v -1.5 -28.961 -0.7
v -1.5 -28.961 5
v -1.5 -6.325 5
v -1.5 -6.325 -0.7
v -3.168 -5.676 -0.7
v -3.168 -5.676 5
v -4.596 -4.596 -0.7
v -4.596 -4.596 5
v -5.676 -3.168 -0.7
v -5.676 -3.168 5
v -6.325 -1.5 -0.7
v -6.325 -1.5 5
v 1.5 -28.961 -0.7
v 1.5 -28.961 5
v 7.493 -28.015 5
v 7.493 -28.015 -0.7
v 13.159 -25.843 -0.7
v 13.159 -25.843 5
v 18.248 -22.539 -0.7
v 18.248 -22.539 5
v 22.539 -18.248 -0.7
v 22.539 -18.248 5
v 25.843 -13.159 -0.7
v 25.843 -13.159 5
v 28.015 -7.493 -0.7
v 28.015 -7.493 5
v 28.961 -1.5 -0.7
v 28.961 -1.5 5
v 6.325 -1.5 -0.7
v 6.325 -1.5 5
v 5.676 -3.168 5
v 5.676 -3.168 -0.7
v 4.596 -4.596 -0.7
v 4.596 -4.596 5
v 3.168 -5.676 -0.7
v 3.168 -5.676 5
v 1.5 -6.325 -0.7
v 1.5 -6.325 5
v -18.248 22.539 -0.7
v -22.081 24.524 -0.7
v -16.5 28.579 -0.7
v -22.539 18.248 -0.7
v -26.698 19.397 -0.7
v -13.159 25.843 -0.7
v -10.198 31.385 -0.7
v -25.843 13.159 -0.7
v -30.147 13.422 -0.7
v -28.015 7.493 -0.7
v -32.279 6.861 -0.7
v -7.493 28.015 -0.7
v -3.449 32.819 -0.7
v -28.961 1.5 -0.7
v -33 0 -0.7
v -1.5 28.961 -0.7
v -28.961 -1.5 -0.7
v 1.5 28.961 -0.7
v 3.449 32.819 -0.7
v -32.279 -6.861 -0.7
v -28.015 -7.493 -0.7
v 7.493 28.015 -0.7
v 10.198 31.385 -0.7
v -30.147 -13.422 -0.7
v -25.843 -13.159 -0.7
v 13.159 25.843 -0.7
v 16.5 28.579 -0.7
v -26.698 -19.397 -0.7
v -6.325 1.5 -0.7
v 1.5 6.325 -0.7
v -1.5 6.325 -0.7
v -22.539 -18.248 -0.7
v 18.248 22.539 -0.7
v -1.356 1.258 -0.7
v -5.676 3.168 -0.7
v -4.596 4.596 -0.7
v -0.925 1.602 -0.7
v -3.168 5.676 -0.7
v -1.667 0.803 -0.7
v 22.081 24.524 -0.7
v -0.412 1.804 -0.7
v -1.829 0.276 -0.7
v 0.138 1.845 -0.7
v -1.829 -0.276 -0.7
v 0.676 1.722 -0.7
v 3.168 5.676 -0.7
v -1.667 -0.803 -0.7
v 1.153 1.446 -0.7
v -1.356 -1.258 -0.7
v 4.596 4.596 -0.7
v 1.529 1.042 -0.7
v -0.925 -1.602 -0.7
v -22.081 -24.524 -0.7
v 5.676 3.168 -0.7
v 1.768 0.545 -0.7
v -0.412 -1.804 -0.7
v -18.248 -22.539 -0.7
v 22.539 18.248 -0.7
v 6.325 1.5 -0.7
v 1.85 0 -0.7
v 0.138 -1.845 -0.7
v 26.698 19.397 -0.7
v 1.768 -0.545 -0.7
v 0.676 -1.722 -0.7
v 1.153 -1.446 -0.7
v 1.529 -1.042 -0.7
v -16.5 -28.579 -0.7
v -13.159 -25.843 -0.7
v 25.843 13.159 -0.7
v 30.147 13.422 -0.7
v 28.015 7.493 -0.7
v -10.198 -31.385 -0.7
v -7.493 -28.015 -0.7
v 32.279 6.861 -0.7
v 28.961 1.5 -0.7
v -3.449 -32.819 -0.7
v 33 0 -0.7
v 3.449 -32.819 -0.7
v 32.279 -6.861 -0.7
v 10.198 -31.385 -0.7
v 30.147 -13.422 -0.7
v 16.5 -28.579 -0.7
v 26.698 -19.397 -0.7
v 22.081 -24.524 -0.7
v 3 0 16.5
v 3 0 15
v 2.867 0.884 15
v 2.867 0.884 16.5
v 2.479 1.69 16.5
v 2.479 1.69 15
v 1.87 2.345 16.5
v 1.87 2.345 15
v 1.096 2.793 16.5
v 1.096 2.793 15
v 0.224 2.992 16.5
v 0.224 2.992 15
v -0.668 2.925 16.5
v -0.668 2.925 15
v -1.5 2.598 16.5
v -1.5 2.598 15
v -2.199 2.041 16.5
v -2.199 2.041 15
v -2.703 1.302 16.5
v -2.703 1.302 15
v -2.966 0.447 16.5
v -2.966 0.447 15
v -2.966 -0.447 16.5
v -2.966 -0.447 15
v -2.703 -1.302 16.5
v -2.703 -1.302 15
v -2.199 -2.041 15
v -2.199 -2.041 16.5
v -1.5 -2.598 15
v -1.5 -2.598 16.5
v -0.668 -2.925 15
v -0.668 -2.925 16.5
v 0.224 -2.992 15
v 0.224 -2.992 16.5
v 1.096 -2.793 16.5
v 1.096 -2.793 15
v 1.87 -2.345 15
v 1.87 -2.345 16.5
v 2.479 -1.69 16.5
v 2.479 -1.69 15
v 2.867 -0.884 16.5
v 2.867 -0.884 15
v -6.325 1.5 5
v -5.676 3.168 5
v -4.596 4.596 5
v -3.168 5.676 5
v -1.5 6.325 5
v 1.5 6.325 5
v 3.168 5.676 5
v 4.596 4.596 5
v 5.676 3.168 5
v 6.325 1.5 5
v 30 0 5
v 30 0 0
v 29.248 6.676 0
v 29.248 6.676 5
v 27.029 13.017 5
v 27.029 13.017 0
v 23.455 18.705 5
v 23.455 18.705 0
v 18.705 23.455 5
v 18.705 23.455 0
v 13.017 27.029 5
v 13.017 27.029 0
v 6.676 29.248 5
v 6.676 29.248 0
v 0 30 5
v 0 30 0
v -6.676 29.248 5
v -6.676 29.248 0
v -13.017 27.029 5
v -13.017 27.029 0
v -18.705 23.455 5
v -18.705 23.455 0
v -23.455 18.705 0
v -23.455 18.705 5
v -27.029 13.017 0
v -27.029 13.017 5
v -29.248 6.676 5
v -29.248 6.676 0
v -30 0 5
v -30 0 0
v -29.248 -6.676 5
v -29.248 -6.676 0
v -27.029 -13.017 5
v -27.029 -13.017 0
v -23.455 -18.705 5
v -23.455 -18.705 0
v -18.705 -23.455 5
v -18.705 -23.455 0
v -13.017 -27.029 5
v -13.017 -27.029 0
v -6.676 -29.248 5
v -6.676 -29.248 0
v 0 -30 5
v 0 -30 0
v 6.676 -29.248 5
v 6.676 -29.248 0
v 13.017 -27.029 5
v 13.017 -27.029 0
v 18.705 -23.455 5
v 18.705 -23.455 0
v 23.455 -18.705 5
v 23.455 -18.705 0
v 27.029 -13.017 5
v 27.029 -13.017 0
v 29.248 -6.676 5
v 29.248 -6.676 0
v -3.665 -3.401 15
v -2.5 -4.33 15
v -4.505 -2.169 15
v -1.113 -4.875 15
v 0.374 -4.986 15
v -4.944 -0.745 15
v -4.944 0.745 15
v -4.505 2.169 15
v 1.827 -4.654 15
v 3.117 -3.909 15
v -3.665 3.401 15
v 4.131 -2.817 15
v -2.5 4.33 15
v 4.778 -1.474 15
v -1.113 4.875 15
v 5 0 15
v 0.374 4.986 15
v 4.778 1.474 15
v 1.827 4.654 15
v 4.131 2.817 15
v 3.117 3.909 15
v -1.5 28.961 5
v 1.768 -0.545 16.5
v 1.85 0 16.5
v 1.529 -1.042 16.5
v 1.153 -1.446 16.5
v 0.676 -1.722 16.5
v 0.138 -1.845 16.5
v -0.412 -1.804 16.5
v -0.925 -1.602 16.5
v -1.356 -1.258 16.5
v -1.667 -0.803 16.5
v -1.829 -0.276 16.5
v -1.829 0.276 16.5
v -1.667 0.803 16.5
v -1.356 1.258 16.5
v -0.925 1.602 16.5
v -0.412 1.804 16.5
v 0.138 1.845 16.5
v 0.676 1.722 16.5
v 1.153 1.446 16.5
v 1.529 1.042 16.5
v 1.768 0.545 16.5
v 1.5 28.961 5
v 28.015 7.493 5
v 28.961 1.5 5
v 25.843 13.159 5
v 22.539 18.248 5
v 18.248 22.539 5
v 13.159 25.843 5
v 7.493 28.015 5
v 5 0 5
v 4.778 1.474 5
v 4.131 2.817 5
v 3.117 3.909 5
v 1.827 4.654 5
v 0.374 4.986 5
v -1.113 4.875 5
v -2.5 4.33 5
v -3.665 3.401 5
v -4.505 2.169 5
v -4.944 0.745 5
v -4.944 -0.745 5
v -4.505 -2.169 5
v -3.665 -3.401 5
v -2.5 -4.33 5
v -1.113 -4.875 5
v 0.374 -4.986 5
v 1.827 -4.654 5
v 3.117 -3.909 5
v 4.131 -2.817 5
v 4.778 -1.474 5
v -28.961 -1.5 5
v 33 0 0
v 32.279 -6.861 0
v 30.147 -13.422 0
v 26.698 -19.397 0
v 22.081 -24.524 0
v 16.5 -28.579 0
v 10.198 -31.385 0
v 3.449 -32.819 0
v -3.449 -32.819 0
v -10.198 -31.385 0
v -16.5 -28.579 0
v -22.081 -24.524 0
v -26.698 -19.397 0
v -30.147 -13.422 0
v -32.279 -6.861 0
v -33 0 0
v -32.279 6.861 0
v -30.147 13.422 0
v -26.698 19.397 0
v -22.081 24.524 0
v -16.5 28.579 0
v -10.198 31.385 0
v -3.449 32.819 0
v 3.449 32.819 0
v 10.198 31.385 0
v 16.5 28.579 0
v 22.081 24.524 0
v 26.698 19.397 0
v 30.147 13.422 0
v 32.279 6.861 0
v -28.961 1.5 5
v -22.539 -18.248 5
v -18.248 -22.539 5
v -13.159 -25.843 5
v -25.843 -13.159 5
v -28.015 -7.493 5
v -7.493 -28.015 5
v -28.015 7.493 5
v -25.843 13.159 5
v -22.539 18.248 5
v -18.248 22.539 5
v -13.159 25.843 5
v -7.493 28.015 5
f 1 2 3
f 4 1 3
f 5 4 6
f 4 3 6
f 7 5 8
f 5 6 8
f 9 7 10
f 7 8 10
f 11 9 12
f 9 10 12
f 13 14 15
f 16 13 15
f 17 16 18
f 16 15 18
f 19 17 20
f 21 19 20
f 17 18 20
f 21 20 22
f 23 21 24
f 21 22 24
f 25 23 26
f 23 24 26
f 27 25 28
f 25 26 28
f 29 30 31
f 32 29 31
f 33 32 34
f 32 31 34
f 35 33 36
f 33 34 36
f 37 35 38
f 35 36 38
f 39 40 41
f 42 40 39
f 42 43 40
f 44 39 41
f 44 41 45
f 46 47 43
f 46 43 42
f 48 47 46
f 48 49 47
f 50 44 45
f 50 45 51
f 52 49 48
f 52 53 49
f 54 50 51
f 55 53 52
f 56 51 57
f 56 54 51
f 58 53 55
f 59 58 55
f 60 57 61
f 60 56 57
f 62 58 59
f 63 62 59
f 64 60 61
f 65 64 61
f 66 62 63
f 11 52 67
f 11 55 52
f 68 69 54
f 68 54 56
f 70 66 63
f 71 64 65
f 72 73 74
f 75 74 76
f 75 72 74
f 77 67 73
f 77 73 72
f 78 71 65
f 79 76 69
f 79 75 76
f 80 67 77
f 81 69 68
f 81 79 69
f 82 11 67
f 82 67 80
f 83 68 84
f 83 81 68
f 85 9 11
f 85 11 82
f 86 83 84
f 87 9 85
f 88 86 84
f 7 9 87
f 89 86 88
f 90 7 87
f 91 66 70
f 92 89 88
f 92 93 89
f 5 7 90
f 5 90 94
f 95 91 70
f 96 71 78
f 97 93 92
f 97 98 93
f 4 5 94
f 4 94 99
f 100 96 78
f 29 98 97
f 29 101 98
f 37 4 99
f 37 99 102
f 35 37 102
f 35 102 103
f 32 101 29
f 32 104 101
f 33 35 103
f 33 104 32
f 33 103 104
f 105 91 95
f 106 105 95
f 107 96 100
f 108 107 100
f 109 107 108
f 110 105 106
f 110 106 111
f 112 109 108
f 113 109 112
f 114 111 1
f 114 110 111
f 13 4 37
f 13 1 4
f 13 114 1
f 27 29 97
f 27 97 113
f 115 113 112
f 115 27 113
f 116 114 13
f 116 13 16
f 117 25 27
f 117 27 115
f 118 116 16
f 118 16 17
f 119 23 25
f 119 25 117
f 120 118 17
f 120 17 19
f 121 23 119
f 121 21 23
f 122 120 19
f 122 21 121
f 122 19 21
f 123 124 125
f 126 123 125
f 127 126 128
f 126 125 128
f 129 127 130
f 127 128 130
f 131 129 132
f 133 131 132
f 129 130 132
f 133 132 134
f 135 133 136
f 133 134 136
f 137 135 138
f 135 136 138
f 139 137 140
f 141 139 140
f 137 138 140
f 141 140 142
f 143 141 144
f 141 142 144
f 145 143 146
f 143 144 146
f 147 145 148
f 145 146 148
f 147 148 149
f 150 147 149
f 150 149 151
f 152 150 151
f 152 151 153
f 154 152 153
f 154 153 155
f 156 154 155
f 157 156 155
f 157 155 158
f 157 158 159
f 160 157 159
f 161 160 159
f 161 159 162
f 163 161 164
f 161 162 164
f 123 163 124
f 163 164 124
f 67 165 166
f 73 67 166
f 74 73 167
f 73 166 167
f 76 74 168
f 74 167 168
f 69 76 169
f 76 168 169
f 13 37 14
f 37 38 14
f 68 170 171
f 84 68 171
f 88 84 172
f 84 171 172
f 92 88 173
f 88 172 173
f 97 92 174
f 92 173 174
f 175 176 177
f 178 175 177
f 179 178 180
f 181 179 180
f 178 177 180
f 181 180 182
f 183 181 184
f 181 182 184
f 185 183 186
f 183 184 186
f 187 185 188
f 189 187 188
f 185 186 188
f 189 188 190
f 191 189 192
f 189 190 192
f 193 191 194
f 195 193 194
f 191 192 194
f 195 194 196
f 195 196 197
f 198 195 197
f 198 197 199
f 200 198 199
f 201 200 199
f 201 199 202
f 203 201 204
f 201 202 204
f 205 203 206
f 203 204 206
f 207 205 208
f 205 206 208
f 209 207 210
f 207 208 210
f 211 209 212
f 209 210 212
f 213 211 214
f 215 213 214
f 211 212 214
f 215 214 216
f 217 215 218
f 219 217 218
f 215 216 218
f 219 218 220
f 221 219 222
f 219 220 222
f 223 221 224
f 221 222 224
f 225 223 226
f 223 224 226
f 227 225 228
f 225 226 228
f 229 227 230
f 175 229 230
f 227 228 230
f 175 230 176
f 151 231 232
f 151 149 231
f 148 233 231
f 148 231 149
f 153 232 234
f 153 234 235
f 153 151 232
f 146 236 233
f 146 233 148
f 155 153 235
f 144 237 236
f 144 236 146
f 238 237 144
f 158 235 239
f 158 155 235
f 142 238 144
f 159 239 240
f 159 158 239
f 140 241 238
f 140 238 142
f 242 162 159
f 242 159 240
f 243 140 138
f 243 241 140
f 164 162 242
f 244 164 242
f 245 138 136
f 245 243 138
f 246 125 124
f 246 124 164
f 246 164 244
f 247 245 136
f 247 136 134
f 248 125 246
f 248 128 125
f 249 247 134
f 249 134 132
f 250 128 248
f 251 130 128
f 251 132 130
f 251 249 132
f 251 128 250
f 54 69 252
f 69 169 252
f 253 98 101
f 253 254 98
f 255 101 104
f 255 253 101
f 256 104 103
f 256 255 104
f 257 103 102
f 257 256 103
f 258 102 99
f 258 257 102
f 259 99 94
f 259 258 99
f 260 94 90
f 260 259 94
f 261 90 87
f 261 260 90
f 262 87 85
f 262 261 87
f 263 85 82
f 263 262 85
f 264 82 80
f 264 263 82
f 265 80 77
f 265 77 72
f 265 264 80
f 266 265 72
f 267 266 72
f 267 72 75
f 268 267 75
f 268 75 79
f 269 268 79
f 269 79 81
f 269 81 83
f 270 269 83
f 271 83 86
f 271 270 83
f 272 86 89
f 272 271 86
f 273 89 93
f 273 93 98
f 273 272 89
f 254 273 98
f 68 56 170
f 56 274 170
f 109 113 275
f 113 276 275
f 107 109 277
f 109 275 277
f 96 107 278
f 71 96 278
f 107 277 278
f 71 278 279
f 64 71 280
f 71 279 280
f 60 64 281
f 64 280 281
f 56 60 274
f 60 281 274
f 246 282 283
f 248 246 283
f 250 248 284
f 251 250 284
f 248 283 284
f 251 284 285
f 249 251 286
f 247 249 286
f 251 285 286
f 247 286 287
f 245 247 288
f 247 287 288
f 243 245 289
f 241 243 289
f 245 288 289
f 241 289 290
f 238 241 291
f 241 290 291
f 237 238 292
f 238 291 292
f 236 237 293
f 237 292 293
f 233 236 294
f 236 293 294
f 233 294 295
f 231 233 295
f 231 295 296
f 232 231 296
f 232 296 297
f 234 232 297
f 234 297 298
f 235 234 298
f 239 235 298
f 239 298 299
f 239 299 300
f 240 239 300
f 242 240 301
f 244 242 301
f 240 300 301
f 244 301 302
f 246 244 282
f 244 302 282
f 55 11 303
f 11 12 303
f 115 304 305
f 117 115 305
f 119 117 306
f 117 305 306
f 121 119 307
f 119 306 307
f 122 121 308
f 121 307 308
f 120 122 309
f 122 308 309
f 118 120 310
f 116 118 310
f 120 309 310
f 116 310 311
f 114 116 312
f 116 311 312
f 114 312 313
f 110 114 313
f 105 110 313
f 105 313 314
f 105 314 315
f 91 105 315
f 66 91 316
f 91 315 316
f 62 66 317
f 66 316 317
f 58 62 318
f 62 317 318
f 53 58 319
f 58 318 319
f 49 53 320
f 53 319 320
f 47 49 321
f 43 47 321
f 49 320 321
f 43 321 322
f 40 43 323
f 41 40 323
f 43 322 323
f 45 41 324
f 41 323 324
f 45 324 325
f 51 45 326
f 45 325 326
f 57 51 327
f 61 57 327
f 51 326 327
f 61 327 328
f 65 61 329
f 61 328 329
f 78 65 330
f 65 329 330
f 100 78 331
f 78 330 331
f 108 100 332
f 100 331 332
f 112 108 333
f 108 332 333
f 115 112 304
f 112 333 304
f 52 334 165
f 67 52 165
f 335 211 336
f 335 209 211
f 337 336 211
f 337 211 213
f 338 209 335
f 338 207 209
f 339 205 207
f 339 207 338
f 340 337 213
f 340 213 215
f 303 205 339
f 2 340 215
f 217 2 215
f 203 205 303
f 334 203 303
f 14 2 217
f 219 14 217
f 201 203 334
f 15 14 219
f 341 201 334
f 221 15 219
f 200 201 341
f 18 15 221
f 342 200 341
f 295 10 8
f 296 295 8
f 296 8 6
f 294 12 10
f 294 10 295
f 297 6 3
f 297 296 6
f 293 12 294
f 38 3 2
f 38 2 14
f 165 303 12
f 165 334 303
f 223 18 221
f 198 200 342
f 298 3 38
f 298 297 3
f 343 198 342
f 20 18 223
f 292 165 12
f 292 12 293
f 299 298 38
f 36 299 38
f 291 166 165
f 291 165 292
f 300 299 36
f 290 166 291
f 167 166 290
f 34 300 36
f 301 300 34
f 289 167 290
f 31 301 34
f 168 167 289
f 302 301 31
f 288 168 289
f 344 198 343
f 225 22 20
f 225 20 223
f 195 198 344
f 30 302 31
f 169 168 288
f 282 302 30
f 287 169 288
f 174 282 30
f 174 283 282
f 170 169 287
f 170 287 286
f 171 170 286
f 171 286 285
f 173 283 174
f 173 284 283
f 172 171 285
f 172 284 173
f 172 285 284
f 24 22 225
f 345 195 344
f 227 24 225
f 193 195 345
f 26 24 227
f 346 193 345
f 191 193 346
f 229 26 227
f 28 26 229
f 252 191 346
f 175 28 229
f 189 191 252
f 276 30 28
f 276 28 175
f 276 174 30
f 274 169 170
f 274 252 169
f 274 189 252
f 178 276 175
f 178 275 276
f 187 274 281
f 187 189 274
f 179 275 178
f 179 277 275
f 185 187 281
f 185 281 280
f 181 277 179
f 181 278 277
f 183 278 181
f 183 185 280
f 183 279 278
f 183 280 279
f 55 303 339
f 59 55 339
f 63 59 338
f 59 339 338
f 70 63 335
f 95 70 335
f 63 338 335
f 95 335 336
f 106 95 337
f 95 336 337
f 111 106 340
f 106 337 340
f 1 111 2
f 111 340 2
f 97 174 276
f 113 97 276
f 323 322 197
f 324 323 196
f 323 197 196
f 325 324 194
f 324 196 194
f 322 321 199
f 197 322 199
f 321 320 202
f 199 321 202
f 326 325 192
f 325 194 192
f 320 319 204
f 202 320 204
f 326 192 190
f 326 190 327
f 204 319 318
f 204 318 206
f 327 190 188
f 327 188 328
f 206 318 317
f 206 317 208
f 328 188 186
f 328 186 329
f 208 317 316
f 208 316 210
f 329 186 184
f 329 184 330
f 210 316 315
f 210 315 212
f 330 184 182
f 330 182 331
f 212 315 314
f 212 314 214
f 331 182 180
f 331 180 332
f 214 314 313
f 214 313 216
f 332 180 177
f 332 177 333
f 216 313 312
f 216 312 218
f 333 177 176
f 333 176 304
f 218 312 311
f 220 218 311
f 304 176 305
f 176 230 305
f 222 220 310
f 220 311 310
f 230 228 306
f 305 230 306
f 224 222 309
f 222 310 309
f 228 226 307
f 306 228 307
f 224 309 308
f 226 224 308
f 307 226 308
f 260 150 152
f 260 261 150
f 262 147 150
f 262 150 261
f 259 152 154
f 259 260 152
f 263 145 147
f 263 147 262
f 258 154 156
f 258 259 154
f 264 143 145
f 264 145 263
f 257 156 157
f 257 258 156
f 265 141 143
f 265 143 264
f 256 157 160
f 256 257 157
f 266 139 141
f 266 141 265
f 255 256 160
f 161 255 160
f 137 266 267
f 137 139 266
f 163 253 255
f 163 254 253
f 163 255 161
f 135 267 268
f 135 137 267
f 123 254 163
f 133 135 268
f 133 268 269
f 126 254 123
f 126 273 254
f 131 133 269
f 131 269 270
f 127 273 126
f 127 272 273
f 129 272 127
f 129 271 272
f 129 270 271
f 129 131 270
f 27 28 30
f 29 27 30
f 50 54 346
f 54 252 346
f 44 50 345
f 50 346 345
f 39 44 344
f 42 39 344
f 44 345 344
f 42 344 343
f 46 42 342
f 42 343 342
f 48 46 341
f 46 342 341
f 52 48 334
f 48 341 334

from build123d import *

# Parameters (mm, degrees)
F0_R      = 30
F1_DEPTH  = 5
F2_R      = 5
F3_DEPTH  = 10
F4_R      = 1.85
F5_DEPTH  = 15
F6_R      = 3
F6_R_2    = 1.85
F7_DEPTH  = 1.5
F9_DEPTH  = 5
F10_R     = 33
F10_R_2   = 30
F10_R_3   = 1.85
F11_DEPTH = 0.7


with BuildPart() as f1:
    # F0 (on Top) → F1 (new body)
    with BuildSketch(Plane.XY):
        Circle(F0_R)
    extrude(amount=F1_DEPTH)

    # F2 (on face) → F3 (join)
    with BuildSketch(Plane.XY.offset(5)):
        Circle(F2_R)
    extrude(amount=F3_DEPTH)

    # F4 (on face) → F5 (cut, through all)
    with BuildSketch(Plane.XY.offset(15)):
        Circle(F4_R)
    extrude(amount=-F5_DEPTH, mode=Mode.SUBTRACT)

    # F6 (on face) → F7 (join)
    with BuildSketch(Plane.XY.offset(15)):
        Circle(F6_R)
        Circle(F6_R_2, mode=Mode.SUBTRACT)
    extrude(amount=F7_DEPTH)

    # F8 (on face) → F9 (cut, through all)
    with BuildSketch(Plane.XY.offset(5)):
        with BuildLine():
            Line((6.3245553203, 1.5), (28.9611809151, 1.5))
            ThreePointArc((28.9611809151, 1.5), (20.5060966544, 20.5060966544), (1.5, 28.9611809151))
            Line((1.5, 28.9611809151), (1.5, 6.3245553203))
            ThreePointArc((1.5, 6.3245553203), (4.5961940777, 4.5961940777), (6.3245553203, 1.5))
        make_face()
        with BuildLine():
            Line((-1.5, 6.3245553203), (-1.5, 28.9611809151))
            ThreePointArc((-1.5, 28.9611809151), (-20.5060966544, 20.5060966544), (-28.9611809151, 1.5))
            Line((-28.9611809151, 1.5), (-6.3245553203, 1.5))
            ThreePointArc((-6.3245553203, 1.5), (-4.5961940777, 4.5961940777), (-1.5, 6.3245553203))
        make_face()
        with BuildLine():
            ThreePointArc((-28.9611809151, -1.5), (-20.5060966544, -20.5060966544), (-1.5, -28.9611809151))
            Line((-1.5, -28.9611809151), (-1.5, -6.3245553203))
            ThreePointArc((-1.5, -6.3245553203), (-4.5961940777, -4.5961940777), (-6.3245553203, -1.5))
            Line((-6.3245553203, -1.5), (-28.9611809151, -1.5))
        make_face()
        with BuildLine():
            ThreePointArc((1.5, -28.9611809151), (20.5060966544, -20.5060966544), (28.9611809151, -1.5))
            Line((28.9611809151, -1.5), (6.3245553203, -1.5))
            ThreePointArc((6.3245553203, -1.5), (4.5961940777, -4.5961940777), (1.5, -6.3245553203))
            Line((1.5, -6.3245553203), (1.5, -28.9611809151))
        make_face()
    extrude(amount=-F9_DEPTH, mode=Mode.SUBTRACT)

    # F10 (on face) → F11 (join)
    with BuildSketch(Plane(origin=(0, 0, 0), x_dir=(1, 0, 0), z_dir=(0, 0, -1))):
        Circle(F10_R)
        Circle(F10_R_2, mode=Mode.SUBTRACT)
        Circle(F10_R_2)
        with BuildLine():
            Line((-1.5, -6.3245553203), (-1.5, -28.9611809151))
            ThreePointArc((-1.5, -28.9611809151), (-20.5060966544, -20.5060966544), (-28.9611809151, -1.5))
            Line((-28.9611809151, -1.5), (-6.3245553203, -1.5))
            ThreePointArc((-6.3245553203, -1.5), (-4.5961940777, -4.5961940777), (-1.5, -6.3245553203))
        make_face(mode=Mode.SUBTRACT)
        with BuildLine():
            ThreePointArc((28.9611809151, -1.5), (20.5060966544, -20.5060966544), (1.5, -28.9611809151))
            Line((1.5, -28.9611809151), (1.5, -6.3245553203))
            ThreePointArc((1.5, -6.3245553203), (4.5961940777, -4.5961940777), (6.3245553203, -1.5))
            Line((6.3245553203, -1.5), (28.9611809151, -1.5))
        make_face(mode=Mode.SUBTRACT)
        with BuildLine():
            ThreePointArc((-1.5, 6.3245553203), (-4.5961940777, 4.5961940777), (-6.3245553203, 1.5))
            Line((-6.3245553203, 1.5), (-28.9611809151, 1.5))
            ThreePointArc((-28.9611809151, 1.5), (-20.5060966544, 20.5060966544), (-1.5, 28.9611809151))
            Line((-1.5, 28.9611809151), (-1.5, 6.3245553203))
        make_face(mode=Mode.SUBTRACT)
        Circle(F10_R_3, mode=Mode.SUBTRACT)
        with BuildLine():
            Line((1.5, 6.3245553203), (1.5, 28.9611809151))
            ThreePointArc((1.5, 28.9611809151), (20.5060966544, 20.5060966544), (28.9611809151, 1.5))
            Line((28.9611809151, 1.5), (6.3245553203, 1.5))
            ThreePointArc((6.3245553203, 1.5), (4.5961940777, 4.5961940777), (1.5, 6.3245553203))
        make_face(mode=Mode.SUBTRACT)
    extrude(amount=F11_DEPTH)


solid = f1.part
